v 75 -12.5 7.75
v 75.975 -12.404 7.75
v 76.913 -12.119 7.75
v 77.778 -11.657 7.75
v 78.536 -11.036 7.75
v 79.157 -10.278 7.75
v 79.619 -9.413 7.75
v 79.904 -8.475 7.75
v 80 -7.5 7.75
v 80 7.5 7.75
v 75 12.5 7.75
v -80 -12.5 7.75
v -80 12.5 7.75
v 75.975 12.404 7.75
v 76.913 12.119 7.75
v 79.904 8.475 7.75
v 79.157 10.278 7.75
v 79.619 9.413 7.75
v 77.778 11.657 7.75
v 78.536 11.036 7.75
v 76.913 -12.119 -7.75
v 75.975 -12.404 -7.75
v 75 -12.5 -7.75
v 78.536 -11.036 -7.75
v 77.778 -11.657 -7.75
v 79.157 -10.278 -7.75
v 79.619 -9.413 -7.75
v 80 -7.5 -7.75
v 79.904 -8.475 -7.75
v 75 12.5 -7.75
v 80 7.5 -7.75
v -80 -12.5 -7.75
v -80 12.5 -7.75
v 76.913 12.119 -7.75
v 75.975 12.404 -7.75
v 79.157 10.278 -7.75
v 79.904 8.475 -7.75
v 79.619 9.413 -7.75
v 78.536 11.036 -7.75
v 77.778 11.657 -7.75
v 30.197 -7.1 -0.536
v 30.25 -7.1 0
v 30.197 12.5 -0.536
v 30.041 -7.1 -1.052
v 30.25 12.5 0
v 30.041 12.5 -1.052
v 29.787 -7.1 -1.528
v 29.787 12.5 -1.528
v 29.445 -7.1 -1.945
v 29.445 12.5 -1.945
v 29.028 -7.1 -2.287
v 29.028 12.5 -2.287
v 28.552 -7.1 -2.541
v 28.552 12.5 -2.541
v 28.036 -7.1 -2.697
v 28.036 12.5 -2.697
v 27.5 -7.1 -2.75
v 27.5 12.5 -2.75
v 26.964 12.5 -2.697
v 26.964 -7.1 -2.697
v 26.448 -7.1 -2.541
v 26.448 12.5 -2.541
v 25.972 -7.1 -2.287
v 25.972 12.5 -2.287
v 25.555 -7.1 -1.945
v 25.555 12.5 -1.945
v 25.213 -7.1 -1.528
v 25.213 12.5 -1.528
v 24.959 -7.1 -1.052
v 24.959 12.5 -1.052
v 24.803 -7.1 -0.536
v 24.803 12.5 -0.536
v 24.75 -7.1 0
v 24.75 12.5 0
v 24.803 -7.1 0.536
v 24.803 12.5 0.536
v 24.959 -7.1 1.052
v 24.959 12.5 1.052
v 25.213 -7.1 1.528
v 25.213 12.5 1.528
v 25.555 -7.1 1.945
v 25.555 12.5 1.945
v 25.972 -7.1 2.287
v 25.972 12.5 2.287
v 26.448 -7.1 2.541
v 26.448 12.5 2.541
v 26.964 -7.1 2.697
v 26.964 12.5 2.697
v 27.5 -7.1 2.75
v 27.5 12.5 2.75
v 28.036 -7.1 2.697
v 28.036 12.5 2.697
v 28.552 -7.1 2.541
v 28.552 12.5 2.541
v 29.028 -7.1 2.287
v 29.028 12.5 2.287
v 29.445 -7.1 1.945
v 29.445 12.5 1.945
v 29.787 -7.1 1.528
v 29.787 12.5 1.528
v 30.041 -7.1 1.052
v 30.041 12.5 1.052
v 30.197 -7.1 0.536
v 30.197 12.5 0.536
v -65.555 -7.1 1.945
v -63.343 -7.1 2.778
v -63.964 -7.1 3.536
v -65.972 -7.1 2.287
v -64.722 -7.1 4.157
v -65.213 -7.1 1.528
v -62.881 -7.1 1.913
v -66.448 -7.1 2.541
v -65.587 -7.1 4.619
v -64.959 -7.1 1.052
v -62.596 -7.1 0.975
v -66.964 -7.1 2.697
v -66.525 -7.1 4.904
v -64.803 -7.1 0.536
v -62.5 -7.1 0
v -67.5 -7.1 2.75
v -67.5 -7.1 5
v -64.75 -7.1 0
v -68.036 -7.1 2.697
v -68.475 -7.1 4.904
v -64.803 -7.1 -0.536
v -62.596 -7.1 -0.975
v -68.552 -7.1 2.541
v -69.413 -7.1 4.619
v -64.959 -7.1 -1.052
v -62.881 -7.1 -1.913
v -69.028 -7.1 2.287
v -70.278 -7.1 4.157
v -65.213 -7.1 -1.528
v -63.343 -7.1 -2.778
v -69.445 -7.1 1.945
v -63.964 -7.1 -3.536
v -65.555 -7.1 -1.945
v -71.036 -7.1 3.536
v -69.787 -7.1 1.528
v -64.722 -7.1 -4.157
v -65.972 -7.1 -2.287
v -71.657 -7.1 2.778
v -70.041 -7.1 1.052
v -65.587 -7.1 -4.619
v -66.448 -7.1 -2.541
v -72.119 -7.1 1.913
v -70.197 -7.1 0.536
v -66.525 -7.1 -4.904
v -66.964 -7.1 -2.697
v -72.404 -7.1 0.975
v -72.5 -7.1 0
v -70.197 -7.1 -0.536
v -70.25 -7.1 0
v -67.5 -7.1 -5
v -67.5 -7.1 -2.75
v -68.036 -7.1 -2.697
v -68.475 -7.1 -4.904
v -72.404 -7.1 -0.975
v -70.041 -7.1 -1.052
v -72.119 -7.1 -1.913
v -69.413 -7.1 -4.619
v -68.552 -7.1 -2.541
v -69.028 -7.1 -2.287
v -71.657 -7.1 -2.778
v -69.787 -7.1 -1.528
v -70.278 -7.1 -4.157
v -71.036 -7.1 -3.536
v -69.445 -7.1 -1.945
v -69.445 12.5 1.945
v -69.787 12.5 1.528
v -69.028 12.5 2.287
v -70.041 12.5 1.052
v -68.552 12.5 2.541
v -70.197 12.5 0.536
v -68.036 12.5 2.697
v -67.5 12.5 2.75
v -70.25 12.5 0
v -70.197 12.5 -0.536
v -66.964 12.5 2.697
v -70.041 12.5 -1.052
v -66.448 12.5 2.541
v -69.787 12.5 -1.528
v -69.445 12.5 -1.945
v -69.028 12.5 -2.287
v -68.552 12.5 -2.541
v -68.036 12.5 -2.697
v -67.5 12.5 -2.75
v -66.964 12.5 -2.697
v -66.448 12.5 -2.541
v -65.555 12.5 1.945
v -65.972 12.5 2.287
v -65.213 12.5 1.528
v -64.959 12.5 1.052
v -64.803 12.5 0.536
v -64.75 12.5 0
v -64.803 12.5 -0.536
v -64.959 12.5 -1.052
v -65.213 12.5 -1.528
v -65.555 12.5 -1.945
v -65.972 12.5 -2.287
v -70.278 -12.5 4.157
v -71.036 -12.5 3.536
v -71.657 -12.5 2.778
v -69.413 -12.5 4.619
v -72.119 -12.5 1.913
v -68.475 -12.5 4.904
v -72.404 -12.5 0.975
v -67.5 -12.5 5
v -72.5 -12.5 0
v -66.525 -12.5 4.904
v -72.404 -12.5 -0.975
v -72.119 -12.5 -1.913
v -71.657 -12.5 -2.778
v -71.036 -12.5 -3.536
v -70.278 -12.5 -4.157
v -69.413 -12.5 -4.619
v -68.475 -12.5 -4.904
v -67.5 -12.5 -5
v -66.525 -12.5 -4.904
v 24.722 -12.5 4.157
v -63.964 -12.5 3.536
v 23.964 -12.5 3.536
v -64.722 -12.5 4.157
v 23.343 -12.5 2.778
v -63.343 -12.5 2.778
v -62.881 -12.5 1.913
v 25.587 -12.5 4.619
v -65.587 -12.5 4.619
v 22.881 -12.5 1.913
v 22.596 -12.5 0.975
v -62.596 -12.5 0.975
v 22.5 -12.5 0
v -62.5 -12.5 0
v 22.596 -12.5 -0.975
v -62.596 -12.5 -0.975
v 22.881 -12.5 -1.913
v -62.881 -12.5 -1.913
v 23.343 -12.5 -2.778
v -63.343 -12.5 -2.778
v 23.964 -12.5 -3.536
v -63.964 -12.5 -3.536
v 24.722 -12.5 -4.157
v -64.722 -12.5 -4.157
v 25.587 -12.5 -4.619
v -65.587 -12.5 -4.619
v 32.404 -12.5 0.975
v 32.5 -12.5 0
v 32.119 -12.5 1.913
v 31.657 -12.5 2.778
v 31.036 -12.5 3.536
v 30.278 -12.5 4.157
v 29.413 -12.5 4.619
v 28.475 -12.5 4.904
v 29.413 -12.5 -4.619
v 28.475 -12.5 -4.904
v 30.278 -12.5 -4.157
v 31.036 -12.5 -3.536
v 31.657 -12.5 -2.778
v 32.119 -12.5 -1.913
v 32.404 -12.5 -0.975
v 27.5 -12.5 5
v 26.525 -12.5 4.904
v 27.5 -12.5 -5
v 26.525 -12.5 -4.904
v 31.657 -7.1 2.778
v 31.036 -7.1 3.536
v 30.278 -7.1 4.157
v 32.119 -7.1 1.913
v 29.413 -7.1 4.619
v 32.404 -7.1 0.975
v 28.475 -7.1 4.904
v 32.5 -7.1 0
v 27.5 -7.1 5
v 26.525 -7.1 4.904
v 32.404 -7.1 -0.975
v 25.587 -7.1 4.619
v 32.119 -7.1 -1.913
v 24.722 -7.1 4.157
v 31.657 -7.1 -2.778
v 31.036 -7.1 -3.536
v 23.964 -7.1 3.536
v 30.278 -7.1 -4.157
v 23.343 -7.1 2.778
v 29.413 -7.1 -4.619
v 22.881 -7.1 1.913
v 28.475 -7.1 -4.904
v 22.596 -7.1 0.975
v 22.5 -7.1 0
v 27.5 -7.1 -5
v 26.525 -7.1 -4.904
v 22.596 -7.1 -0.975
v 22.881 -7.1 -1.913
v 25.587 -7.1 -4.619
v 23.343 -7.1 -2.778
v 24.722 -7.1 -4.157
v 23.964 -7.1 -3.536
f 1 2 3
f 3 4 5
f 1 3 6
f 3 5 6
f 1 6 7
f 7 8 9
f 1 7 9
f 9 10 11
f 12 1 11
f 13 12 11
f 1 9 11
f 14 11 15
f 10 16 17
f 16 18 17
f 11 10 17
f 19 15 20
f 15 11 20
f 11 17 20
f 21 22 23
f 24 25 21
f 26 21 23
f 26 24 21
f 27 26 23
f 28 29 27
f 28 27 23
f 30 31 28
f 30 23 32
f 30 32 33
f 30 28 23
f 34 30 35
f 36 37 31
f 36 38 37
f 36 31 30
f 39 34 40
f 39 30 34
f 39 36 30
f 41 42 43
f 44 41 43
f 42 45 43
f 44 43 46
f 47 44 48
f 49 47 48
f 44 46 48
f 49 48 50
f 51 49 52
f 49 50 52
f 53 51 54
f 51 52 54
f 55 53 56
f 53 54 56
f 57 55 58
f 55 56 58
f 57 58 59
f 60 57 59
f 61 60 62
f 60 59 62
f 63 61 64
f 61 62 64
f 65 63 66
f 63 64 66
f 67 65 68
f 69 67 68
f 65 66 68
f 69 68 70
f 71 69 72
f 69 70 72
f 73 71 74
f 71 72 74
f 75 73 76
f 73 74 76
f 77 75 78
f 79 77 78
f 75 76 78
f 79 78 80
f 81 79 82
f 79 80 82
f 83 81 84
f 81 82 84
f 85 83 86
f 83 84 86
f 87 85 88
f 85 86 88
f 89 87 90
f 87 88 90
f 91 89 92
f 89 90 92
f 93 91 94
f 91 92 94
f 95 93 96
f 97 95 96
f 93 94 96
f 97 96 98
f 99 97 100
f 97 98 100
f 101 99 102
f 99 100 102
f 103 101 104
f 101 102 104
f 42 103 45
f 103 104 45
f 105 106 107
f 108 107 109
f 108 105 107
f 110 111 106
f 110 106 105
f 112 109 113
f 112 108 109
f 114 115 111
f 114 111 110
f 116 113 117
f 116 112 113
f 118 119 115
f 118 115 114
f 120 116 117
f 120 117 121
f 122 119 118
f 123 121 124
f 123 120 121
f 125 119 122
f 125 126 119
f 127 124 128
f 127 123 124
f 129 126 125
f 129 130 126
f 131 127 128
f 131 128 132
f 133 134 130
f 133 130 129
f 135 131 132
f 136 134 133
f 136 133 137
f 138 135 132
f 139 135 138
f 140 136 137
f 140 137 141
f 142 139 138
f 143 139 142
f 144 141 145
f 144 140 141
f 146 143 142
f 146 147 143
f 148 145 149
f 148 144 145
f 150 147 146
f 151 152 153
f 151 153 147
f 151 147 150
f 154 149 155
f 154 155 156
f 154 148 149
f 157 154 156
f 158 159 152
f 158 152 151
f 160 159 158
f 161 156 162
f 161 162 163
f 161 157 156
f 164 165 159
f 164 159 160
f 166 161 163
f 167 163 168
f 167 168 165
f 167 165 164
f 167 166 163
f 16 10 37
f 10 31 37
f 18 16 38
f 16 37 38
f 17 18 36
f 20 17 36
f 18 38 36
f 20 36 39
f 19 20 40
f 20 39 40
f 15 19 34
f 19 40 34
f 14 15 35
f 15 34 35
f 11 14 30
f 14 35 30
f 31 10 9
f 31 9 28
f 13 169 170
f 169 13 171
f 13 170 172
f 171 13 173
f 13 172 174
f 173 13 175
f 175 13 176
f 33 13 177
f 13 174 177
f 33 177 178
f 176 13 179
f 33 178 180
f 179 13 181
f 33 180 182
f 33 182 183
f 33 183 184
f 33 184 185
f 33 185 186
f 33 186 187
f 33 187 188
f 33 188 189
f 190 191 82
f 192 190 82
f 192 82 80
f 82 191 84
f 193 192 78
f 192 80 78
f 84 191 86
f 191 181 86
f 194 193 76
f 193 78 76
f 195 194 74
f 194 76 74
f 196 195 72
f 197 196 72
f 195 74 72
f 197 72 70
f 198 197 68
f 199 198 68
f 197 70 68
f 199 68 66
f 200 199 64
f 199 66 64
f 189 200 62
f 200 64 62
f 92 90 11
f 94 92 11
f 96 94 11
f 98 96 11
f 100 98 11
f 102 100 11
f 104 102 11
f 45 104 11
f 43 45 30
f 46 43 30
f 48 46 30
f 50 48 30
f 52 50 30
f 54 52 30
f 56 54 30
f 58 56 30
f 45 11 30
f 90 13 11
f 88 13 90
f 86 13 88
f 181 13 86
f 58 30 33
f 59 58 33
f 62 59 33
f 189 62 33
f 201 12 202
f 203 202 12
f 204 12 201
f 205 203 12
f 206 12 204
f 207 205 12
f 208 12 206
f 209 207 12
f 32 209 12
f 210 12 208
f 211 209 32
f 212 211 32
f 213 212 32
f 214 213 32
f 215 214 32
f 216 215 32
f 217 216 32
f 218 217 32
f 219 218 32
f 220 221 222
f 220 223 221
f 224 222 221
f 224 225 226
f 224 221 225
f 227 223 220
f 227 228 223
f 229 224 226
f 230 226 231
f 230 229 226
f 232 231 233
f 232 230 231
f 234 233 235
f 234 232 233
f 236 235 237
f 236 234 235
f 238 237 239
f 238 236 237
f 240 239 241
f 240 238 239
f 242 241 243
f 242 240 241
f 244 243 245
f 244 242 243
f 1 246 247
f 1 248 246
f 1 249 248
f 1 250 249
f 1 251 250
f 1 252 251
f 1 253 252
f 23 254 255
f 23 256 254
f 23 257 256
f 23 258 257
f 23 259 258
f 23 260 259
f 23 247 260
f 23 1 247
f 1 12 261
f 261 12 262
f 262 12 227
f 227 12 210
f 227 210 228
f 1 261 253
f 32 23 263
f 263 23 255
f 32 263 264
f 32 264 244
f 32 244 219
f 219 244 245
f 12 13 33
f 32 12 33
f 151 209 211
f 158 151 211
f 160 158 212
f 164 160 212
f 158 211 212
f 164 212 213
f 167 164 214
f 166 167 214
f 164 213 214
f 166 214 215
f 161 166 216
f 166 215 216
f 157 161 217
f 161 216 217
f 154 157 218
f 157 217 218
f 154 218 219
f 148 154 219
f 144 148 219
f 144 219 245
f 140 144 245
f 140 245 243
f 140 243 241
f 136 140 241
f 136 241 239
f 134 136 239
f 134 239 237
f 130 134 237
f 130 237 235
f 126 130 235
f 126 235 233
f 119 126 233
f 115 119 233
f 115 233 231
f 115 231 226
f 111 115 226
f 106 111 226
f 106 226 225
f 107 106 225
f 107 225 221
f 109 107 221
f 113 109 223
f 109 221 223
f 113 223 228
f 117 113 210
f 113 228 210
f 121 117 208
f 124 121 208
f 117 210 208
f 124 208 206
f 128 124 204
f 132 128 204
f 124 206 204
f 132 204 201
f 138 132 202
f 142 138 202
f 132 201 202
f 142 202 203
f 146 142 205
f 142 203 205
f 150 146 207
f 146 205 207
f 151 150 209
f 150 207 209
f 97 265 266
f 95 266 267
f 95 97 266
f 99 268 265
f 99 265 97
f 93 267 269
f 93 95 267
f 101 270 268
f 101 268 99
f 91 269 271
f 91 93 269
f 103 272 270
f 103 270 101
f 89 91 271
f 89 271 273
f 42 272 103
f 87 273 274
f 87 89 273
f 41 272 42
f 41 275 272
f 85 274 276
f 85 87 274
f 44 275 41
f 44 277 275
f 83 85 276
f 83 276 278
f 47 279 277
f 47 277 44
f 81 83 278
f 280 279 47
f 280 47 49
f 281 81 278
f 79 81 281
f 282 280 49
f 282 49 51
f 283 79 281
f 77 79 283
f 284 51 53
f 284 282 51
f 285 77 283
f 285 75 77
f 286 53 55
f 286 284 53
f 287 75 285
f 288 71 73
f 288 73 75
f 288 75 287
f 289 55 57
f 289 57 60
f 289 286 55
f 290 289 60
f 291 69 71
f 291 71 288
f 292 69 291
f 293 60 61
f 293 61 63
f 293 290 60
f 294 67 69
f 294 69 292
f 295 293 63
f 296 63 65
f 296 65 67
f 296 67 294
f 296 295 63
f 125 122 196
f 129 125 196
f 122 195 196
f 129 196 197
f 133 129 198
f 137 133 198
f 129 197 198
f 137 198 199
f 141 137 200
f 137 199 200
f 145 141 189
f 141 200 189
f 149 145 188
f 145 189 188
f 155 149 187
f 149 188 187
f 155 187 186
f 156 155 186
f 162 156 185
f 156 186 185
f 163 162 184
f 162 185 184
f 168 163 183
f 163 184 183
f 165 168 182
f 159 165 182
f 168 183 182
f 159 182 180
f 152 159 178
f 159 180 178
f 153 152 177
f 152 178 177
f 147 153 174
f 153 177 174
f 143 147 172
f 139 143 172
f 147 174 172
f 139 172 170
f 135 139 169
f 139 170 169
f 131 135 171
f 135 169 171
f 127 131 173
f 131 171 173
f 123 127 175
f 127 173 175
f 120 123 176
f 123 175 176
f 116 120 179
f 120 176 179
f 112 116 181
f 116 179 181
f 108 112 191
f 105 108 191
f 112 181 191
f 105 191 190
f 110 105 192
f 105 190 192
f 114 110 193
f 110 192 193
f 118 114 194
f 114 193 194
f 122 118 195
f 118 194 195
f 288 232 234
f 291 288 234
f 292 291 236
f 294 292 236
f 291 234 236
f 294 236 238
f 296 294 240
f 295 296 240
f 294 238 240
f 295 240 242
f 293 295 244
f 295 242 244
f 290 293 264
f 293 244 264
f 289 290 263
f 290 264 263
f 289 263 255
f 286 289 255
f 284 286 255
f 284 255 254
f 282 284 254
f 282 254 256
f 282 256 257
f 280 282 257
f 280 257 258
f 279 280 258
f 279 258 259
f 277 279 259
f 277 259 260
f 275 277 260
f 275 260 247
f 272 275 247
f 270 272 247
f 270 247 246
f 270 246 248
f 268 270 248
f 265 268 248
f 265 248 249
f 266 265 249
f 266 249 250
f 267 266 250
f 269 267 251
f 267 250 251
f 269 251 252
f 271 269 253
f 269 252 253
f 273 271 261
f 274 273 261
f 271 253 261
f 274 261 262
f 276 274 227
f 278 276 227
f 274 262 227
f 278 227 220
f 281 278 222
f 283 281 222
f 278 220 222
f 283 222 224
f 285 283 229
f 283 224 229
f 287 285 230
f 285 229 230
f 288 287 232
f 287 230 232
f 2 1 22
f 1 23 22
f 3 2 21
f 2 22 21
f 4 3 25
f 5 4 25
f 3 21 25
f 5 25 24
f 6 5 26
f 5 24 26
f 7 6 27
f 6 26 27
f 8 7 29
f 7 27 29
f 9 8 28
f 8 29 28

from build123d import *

# Parameters (mm, degrees)
SKETCH1_W                                           = 15.5
SKETCH1_H                                           = 25
BOSS_EXTRUDE1_DEPTH                                 = 80
CBORE_FOR_M5_HEX_SOCKET_HEAD_CAP_SCREW1_D           = 5.5
CBORE_FOR_M5_HEX_SOCKET_HEAD_CAP_SCREW1_CBORE_D     = 10
CBORE_FOR_M5_HEX_SOCKET_HEAD_CAP_SCREW1_CBORE_DEPTH = 5.4
FILLET1_R                                           = 5
FILLET2_R                                           = 5


with BuildPart() as part:
    # Sketch1 → Boss-Extrude1 (new body, symmetric)
    with BuildSketch(Plane(origin=(0, 0, 0), x_dir=(0, 0, -1), z_dir=(1, 0, 0))):
        Rectangle(SKETCH1_W, SKETCH1_H)
    extrude(amount=BOSS_EXTRUDE1_DEPTH, both=True)

    # CBORE for M5 Hex Socket Head Cap Screw1 (through all)
    with Locations(Plane(origin=(0, -12.5, 0), x_dir=(-1, 0, 0), z_dir=(0, -1, 0))):
        with Locations((-27.5, 0), (67.5, 0)):
            CounterBoreHole(CBORE_FOR_M5_HEX_SOCKET_HEAD_CAP_SCREW1_D / 2, CBORE_FOR_M5_HEX_SOCKET_HEAD_CAP_SCREW1_CBORE_D / 2, CBORE_FOR_M5_HEX_SOCKET_HEAD_CAP_SCREW1_CBORE_DEPTH)

    # Fillet1
    fillet1_edges = [part.edges().sort_by_distance(p)[0] for p in [
        (80, -12.5, 0),
    ]]
    fillet(fillet1_edges, radius=FILLET1_R)

    # Fillet2
    fillet2_edges = [part.edges().sort_by_distance(p)[0] for p in [
        (80, 12.5, 0),
    ]]
    fillet(fillet2_edges, radius=FILLET2_R)


solid = part.part
